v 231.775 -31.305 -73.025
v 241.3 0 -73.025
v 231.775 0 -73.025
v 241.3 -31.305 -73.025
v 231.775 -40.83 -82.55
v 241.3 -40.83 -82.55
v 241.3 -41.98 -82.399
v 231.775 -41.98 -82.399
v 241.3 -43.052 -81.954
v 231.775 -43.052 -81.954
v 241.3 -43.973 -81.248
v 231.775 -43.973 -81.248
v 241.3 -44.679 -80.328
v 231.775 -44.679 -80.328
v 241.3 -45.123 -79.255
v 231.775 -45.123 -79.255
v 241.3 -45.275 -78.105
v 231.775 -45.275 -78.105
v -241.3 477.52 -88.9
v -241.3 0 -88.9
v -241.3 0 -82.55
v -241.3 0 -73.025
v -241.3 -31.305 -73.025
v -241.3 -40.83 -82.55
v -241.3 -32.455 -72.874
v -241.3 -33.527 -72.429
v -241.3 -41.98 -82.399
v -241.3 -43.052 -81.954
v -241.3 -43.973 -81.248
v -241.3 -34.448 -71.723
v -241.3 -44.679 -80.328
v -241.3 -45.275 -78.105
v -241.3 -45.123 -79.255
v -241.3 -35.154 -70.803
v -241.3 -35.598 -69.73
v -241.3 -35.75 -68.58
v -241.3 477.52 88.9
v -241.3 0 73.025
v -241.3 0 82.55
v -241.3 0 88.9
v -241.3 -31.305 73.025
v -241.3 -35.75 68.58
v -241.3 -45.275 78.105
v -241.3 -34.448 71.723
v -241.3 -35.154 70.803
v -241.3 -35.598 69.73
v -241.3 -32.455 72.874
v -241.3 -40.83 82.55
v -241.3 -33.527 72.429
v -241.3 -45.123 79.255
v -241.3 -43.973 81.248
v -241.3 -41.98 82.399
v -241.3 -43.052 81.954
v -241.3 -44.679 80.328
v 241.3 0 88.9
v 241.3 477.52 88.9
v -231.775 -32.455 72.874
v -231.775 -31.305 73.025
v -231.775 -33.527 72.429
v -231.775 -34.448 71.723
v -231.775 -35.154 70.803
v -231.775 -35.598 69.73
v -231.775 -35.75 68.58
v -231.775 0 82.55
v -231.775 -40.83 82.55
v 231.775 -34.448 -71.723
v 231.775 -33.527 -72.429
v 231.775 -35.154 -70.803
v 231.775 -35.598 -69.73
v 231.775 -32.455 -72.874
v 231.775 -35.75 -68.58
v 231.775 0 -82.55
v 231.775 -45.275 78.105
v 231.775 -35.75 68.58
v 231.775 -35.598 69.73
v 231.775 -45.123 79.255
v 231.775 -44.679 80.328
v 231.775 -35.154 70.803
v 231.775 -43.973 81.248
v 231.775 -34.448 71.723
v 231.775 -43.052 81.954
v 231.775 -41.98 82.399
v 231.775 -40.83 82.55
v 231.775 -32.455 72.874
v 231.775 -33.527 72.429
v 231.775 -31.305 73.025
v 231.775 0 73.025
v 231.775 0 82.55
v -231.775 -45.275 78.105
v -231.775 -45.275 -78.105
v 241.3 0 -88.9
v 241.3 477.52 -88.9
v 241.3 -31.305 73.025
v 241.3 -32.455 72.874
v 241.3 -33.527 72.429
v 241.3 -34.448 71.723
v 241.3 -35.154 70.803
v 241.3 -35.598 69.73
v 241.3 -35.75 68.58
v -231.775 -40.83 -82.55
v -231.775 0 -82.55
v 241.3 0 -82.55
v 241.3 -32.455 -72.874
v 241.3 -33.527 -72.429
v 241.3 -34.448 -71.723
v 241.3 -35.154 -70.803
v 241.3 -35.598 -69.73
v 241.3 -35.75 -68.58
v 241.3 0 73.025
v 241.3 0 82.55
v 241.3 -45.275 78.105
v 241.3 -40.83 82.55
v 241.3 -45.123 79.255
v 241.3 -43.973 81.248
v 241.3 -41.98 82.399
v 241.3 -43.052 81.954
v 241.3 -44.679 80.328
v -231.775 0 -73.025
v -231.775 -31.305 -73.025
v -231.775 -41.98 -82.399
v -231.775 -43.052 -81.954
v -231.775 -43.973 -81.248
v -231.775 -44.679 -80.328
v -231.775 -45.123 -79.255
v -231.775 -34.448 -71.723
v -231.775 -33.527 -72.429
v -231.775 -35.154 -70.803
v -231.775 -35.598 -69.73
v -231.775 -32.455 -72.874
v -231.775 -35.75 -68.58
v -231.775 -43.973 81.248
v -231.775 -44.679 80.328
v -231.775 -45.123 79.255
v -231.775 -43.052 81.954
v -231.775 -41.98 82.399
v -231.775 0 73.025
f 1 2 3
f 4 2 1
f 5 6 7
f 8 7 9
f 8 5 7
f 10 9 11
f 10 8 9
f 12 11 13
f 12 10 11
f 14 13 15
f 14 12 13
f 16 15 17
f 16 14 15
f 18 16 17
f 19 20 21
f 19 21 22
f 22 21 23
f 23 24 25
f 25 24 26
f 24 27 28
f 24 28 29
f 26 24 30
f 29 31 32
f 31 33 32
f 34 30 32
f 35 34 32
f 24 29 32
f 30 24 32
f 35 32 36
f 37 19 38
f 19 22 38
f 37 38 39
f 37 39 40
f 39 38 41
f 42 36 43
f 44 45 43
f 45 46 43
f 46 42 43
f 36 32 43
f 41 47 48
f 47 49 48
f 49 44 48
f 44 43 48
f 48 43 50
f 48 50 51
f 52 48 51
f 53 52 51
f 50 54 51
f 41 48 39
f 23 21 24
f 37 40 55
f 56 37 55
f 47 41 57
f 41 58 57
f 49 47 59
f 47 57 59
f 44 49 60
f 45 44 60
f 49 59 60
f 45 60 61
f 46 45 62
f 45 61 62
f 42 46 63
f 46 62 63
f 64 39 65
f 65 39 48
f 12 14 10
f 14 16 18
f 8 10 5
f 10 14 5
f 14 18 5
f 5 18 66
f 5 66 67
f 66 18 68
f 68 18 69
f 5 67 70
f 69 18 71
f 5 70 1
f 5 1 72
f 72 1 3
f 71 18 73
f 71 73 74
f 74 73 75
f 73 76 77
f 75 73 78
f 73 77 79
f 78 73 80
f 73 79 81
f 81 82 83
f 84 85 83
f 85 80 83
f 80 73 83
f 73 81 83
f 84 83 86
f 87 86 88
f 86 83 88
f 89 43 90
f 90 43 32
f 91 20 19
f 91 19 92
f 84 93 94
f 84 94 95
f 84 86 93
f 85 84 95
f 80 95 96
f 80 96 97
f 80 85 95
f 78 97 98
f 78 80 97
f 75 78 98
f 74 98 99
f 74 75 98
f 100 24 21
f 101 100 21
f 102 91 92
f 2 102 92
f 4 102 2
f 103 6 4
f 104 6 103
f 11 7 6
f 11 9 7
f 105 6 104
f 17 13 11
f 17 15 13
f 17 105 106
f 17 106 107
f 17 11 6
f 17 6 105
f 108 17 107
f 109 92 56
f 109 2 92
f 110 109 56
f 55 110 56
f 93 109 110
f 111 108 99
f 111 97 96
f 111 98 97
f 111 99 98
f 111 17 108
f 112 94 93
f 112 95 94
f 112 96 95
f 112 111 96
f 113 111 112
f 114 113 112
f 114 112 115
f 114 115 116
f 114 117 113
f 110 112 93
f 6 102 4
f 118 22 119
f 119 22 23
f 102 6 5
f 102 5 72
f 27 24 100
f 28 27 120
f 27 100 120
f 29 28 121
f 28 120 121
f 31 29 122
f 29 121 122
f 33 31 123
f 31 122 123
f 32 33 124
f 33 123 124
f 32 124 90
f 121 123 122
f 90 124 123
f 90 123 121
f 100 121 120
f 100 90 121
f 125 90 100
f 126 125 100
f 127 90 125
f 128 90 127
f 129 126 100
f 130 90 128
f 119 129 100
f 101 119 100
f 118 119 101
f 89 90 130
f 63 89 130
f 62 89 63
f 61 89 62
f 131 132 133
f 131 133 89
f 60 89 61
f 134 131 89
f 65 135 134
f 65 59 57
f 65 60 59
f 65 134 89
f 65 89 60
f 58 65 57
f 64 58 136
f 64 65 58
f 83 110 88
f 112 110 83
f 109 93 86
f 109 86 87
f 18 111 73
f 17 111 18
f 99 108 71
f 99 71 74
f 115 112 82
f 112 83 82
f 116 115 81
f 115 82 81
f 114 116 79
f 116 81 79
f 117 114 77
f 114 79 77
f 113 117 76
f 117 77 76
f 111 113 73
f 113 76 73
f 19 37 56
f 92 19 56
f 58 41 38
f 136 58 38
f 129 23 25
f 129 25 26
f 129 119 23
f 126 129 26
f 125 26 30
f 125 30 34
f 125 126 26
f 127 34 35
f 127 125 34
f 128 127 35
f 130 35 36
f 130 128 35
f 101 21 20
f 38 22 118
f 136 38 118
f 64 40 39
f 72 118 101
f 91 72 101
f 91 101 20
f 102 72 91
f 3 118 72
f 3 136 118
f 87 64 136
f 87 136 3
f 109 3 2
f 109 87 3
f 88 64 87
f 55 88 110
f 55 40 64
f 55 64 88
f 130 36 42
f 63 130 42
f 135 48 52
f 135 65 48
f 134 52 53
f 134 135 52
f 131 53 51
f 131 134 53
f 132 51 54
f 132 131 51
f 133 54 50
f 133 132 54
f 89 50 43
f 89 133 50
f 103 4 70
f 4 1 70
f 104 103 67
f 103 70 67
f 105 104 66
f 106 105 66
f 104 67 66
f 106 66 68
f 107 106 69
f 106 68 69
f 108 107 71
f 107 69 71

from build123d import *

# Parameters (mm, degrees)
F0_W     = 482.6
F0_H     = 177.8
F1_DEPTH = 477.52
F4_DEPTH = 9.525
F5_R     = 4.445


# Not quite as in the source:
# - a pattern or mirror of a feature is missing from the dataset's text; its kind, count and spacing are read off the source's solid


with BuildPart() as f1:
    # F0 (on Front) → F1 (new body)
    with BuildSketch(Plane.XZ):
        Rectangle(F0_W, F0_H)
    extrude(amount=-F1_DEPTH)

    # F3 (on offset) → F4 (join)
    with BuildSketch(Plane.YZ.offset(241.3)):
        Polygon((0, 73.025), (0, 82.55), (-45.2747344971, 82.55), (-45.2747344971, -82.55), (0, -82.55), (0, -73.025), (-35.7497344971, -73.025), (-35.7497344971, 73.025), align=None)
    f4 = extrude(amount=-F4_DEPTH)

    # F4_copies: F4 across plane
    add(f4.mirror(Plane(origin=(0, 0, 0), x_dir=(0, 0, -1), z_dir=(-1, 0, 0))))

    # F5
    f5_edges = [f1.edges().sort_by_distance(p)[0] for p in [
        (236.5375, -45.274734, 82.55),
        (236.5375, -45.274734, -82.55),
        (236.5375, -35.749734, -73.025),
        (236.5375, -35.749734, 73.025),
        (-236.5375, -45.274734, -82.55),
        (-236.5375, -35.749734, -73.025),
        (-236.5375, -35.749734, 73.025),
        (-236.5375, -45.274734, 82.55),
    ]]
    fillet(f5_edges, radius=F5_R)


solid = f1.part
